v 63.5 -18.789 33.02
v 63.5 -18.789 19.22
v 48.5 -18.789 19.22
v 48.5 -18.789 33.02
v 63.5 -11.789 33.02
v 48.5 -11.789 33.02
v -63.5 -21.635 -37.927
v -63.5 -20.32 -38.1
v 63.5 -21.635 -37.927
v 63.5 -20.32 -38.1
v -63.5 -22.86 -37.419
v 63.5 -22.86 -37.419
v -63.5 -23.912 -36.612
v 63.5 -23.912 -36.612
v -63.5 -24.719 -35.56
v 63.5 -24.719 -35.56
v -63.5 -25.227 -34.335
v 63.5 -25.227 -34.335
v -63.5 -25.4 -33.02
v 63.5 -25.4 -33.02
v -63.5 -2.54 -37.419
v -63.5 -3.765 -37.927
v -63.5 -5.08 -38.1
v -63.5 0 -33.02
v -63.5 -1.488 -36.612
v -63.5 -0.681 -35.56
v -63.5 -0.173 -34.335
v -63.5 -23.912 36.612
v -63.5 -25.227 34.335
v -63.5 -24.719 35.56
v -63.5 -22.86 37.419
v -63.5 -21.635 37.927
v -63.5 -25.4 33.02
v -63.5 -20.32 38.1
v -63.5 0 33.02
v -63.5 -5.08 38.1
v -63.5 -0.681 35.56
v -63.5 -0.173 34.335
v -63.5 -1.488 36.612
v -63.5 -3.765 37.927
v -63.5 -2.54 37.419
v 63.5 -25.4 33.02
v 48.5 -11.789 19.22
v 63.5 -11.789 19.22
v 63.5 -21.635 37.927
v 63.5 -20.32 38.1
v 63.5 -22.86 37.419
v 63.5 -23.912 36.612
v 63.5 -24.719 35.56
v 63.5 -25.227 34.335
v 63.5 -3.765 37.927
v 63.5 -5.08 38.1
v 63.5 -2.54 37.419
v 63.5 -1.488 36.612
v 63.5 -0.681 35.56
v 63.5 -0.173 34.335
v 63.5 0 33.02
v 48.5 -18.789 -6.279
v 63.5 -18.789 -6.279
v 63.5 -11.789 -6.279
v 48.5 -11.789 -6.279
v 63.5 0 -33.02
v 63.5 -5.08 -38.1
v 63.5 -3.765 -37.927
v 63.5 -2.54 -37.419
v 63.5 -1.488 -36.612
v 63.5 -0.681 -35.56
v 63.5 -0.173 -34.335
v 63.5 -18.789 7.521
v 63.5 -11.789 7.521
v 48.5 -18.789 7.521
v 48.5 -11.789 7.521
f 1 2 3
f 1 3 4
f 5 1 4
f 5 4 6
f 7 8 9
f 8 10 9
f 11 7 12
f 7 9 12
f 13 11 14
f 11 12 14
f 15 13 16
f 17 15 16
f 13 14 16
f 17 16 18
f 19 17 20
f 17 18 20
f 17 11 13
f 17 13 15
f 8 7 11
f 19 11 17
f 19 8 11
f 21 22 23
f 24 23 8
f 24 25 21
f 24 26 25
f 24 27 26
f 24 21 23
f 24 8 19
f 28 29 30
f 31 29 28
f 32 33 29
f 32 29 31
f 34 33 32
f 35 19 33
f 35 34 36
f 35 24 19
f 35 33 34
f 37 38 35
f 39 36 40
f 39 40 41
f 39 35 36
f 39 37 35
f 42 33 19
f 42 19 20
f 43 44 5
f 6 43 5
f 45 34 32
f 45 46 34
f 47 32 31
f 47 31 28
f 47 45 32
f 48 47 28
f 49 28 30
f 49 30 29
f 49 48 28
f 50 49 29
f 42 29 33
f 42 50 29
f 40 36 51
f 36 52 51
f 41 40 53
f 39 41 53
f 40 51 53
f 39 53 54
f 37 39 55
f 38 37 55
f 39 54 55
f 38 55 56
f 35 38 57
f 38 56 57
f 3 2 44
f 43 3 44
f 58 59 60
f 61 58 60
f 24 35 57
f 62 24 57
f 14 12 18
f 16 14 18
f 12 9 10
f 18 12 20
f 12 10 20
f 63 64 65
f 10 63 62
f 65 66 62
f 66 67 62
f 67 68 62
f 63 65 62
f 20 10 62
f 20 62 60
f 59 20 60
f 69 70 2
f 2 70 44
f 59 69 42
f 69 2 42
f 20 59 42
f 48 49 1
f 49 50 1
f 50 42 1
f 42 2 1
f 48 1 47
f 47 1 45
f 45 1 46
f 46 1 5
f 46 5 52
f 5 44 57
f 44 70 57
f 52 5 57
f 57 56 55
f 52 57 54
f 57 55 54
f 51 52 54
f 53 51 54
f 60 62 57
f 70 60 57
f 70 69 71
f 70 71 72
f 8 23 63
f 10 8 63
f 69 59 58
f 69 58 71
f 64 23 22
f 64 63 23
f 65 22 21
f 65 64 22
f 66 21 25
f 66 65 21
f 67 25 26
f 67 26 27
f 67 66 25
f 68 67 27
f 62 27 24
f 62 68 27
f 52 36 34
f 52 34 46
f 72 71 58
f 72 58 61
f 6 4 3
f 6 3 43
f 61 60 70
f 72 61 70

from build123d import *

# Parameters (mm, degrees)
F0_W     = 127
F0_H     = 76.2
F1_DEPTH = 25.4
F2_R     = 5.08
F3_W     = 7
F3_H     = 13.8
F4_DEPTH = 15
F5_W     = 7
F5_H     = 13.8
F6_DEPTH = 15


with BuildPart() as f1:
    # F0 (on Front) → F1 (new body)
    with BuildSketch(Plane.XZ):
        Rectangle(F0_W, F0_H)
    extrude(amount=F1_DEPTH)

    # F2
    f2_edges = [f1.edges().sort_by_distance(p)[0] for p in [
        (0, -25.4, 38.1),
        (0, 0, 38.1),
        (0, -25.4, -38.1),
        (0, 0, -38.1),
    ]]
    fillet(f2_edges, radius=F2_R)

    # F3 (on face) → F4 (cut)
    with BuildSketch(Plane.YZ.offset(63.5)):
        with Locations((-15.288545, 26.12)):
            Rectangle(F3_W, F3_H)
    extrude(amount=-F4_DEPTH, mode=Mode.SUBTRACT)

    # F5 (on face) → F6 (cut)
    with BuildSketch(Plane.YZ.offset(63.5)):
        with Locations((-15.288545, 0.620681)):
            Rectangle(F5_W, F5_H)
    extrude(amount=-F6_DEPTH, mode=Mode.SUBTRACT)


solid = f1.part
